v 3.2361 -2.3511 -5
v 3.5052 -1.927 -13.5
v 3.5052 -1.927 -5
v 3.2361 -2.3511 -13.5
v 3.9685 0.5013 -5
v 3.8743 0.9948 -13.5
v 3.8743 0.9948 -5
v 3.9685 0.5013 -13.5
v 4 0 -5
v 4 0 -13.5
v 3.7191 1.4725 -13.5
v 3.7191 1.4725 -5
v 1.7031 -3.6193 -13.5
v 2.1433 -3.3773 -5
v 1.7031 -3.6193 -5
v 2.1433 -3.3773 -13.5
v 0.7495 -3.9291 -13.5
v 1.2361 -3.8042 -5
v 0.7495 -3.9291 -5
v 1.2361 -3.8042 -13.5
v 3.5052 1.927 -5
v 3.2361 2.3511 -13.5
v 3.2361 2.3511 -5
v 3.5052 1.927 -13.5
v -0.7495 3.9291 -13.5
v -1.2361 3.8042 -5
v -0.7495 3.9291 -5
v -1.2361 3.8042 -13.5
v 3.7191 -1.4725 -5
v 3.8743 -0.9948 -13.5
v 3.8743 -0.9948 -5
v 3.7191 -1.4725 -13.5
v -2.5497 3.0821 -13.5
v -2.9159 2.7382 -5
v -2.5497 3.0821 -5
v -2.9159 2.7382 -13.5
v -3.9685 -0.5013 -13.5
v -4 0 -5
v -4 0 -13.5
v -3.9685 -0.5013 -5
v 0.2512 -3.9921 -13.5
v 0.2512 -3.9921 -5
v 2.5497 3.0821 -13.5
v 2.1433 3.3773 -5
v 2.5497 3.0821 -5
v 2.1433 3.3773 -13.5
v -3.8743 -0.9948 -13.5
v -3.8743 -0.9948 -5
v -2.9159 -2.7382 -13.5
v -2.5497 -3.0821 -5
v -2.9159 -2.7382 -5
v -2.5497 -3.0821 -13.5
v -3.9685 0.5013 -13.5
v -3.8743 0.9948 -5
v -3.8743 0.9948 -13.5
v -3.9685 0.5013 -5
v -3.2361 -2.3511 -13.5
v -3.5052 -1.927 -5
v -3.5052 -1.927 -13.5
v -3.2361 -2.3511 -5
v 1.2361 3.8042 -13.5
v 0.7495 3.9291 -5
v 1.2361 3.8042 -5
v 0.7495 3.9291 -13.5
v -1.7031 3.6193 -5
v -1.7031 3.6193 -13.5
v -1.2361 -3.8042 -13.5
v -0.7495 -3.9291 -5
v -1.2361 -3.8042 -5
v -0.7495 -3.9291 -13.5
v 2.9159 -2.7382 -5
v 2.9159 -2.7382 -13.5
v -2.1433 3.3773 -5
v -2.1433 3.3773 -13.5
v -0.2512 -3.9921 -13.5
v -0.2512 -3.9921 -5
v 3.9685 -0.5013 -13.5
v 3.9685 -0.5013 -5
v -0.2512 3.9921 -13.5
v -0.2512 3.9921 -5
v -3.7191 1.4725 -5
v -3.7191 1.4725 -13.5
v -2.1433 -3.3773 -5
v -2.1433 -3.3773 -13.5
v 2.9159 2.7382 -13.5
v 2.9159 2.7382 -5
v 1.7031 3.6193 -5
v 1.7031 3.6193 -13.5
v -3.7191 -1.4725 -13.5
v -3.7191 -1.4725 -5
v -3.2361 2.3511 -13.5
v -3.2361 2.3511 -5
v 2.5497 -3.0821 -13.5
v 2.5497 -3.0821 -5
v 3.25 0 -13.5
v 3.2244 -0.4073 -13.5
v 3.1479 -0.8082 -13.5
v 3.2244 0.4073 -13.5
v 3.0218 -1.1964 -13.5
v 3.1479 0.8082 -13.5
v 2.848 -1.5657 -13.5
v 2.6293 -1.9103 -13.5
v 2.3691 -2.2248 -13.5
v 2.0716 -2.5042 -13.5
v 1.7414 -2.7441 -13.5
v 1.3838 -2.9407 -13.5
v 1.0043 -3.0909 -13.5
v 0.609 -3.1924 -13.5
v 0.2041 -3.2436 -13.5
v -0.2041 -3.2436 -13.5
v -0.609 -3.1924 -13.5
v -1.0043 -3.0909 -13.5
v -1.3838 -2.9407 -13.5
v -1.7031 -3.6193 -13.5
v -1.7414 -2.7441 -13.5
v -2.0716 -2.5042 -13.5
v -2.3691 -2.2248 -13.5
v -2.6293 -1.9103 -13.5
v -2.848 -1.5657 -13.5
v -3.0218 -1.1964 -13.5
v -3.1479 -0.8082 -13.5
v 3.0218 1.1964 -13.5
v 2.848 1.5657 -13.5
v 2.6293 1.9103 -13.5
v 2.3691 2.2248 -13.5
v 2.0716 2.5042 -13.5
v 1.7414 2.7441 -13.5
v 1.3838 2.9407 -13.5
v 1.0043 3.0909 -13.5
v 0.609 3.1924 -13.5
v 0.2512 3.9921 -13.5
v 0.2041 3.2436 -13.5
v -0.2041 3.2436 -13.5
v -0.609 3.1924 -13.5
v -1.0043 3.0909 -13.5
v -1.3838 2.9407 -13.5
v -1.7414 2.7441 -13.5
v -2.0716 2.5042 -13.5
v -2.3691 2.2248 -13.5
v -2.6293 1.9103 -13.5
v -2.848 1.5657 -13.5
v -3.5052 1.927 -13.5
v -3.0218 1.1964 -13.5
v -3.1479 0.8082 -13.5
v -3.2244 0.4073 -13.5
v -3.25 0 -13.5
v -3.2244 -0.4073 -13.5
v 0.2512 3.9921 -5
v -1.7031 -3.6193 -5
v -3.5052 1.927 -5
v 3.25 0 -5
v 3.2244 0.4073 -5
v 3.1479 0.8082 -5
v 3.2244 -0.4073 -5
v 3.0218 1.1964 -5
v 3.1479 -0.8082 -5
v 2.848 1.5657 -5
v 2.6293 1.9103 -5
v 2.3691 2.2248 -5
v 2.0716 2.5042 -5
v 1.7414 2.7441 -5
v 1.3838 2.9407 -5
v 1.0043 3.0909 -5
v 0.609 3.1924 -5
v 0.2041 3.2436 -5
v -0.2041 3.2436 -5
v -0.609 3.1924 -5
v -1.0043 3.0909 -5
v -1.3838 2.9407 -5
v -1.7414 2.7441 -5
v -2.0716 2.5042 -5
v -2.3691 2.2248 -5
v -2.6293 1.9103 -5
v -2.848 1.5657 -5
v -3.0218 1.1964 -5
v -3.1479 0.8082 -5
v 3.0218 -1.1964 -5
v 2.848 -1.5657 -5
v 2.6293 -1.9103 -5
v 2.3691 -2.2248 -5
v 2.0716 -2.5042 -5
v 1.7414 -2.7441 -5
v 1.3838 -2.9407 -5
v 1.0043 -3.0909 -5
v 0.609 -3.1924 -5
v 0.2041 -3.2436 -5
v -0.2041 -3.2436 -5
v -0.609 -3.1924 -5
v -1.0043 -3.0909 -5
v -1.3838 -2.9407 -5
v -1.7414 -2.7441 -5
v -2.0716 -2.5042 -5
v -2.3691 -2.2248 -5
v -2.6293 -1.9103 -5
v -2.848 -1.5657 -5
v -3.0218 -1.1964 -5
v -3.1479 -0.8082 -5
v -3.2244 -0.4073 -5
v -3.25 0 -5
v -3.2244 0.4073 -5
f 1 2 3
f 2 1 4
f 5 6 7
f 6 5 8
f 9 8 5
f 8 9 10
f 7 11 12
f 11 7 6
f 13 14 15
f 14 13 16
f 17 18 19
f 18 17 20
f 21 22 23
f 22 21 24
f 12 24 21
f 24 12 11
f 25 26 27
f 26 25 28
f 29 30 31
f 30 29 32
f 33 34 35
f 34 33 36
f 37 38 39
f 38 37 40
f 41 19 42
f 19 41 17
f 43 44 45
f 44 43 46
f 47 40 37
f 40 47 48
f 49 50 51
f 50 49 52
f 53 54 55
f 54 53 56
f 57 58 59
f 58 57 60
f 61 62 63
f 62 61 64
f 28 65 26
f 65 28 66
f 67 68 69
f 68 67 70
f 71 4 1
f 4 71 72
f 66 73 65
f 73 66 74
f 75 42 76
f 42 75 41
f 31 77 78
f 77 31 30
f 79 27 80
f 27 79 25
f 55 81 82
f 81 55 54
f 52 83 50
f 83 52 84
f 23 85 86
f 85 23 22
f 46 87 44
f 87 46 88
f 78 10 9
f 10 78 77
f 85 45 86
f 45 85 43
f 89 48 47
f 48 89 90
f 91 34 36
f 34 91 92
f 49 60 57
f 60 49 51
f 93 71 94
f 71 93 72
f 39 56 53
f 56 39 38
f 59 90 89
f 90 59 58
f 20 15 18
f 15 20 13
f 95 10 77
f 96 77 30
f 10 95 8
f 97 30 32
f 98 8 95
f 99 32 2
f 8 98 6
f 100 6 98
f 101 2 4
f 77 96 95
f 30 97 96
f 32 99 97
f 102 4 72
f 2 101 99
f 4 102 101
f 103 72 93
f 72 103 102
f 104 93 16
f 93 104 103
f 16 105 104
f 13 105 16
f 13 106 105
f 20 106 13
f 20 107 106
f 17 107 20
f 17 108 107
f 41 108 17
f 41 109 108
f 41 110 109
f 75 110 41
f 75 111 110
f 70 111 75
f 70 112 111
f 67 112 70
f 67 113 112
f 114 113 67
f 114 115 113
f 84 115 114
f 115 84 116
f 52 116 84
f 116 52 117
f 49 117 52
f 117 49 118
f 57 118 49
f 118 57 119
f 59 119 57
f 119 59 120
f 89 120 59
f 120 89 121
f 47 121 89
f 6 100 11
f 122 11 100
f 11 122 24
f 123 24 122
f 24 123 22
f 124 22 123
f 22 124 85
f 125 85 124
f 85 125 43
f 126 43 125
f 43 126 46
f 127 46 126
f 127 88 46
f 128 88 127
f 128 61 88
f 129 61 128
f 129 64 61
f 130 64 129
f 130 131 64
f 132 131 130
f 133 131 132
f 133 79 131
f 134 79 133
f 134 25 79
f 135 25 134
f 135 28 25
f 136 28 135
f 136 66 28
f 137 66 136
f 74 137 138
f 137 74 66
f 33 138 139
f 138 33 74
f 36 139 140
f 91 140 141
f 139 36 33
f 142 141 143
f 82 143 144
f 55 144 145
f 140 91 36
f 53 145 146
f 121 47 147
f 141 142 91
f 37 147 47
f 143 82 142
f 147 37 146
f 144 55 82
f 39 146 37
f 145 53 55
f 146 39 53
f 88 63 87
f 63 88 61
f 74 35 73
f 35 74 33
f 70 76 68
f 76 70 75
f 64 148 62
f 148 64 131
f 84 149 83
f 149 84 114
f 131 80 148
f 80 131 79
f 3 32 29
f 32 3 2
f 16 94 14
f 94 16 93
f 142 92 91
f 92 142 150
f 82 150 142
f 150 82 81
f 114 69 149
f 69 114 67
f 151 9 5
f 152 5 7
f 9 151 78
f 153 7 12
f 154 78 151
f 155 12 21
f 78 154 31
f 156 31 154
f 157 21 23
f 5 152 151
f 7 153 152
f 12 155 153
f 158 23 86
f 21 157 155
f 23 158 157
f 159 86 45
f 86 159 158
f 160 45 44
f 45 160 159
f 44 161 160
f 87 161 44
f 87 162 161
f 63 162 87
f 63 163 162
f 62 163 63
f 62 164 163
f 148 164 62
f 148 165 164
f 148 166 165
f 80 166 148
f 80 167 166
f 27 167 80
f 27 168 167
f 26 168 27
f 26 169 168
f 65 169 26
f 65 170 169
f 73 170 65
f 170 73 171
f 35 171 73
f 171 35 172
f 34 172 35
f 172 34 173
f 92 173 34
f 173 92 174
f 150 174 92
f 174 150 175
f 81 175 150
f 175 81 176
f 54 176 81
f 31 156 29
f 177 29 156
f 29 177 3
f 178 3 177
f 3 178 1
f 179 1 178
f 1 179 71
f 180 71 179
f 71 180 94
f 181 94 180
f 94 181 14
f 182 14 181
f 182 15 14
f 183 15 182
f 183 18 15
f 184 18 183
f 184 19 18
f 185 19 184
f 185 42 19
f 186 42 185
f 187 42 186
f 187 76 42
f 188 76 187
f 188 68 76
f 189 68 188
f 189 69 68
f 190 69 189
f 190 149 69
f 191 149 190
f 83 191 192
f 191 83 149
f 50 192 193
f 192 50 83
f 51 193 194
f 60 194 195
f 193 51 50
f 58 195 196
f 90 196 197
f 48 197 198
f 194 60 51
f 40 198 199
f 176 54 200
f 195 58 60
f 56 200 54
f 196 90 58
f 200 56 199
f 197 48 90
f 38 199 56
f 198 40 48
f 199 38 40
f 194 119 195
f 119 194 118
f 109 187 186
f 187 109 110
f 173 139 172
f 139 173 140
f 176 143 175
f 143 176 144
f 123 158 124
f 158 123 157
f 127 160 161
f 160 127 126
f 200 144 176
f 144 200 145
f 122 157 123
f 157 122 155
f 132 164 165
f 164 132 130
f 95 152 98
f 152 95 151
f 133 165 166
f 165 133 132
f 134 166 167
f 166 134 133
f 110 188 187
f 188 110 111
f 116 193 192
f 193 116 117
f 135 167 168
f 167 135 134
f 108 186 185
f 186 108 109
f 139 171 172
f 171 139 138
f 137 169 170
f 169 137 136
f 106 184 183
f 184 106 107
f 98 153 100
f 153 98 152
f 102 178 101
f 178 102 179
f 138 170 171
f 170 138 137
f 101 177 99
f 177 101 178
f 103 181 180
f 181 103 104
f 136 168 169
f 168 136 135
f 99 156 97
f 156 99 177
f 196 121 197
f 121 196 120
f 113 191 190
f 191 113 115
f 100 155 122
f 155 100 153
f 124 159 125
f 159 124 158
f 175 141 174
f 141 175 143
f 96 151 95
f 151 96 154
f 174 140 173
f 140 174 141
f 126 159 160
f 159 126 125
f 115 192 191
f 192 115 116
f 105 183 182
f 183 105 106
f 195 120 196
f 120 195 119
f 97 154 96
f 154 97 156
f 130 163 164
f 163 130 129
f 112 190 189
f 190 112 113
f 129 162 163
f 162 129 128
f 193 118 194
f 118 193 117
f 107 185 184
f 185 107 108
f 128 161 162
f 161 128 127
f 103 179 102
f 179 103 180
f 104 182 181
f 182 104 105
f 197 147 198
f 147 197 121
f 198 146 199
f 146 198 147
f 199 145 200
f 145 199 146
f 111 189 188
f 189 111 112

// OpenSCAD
$fn = 50;

difference() {
	union() {
		translate(v = [0, 0, -13.5]) {
			cylinder(h = 13.5, r = 4.0);
		}
		#translate(v = [0, 0, -15.0]) {
			cylinder(h = 15, r = 2.875);
		}
	}
	union() {
		translate(v = [0, 0, 0]) {
			rotate(a = [0, 0, 0]) {
				difference() {
					union() {
						translate(v = [0, 0, -5]) {
							linear_extrude(height = 5) {
								polygon(points = [[5.914249999999999, 0.0], [2.957125, 5.1218907443321156], [-2.9571249999999982, 5.1218907443321156], [-5.914249999999999, 7.242867331857232e-16], [-2.9571250000000022, -5.121890744332115], [2.9571249999999956, -5.121890744332118]]);
							}
						}
					}
					union();
				}
			}
		}
		#translate(v = [0, 0, -100.0]) {
			cylinder(h = 200, r = 3.25);
		}
	}
}
